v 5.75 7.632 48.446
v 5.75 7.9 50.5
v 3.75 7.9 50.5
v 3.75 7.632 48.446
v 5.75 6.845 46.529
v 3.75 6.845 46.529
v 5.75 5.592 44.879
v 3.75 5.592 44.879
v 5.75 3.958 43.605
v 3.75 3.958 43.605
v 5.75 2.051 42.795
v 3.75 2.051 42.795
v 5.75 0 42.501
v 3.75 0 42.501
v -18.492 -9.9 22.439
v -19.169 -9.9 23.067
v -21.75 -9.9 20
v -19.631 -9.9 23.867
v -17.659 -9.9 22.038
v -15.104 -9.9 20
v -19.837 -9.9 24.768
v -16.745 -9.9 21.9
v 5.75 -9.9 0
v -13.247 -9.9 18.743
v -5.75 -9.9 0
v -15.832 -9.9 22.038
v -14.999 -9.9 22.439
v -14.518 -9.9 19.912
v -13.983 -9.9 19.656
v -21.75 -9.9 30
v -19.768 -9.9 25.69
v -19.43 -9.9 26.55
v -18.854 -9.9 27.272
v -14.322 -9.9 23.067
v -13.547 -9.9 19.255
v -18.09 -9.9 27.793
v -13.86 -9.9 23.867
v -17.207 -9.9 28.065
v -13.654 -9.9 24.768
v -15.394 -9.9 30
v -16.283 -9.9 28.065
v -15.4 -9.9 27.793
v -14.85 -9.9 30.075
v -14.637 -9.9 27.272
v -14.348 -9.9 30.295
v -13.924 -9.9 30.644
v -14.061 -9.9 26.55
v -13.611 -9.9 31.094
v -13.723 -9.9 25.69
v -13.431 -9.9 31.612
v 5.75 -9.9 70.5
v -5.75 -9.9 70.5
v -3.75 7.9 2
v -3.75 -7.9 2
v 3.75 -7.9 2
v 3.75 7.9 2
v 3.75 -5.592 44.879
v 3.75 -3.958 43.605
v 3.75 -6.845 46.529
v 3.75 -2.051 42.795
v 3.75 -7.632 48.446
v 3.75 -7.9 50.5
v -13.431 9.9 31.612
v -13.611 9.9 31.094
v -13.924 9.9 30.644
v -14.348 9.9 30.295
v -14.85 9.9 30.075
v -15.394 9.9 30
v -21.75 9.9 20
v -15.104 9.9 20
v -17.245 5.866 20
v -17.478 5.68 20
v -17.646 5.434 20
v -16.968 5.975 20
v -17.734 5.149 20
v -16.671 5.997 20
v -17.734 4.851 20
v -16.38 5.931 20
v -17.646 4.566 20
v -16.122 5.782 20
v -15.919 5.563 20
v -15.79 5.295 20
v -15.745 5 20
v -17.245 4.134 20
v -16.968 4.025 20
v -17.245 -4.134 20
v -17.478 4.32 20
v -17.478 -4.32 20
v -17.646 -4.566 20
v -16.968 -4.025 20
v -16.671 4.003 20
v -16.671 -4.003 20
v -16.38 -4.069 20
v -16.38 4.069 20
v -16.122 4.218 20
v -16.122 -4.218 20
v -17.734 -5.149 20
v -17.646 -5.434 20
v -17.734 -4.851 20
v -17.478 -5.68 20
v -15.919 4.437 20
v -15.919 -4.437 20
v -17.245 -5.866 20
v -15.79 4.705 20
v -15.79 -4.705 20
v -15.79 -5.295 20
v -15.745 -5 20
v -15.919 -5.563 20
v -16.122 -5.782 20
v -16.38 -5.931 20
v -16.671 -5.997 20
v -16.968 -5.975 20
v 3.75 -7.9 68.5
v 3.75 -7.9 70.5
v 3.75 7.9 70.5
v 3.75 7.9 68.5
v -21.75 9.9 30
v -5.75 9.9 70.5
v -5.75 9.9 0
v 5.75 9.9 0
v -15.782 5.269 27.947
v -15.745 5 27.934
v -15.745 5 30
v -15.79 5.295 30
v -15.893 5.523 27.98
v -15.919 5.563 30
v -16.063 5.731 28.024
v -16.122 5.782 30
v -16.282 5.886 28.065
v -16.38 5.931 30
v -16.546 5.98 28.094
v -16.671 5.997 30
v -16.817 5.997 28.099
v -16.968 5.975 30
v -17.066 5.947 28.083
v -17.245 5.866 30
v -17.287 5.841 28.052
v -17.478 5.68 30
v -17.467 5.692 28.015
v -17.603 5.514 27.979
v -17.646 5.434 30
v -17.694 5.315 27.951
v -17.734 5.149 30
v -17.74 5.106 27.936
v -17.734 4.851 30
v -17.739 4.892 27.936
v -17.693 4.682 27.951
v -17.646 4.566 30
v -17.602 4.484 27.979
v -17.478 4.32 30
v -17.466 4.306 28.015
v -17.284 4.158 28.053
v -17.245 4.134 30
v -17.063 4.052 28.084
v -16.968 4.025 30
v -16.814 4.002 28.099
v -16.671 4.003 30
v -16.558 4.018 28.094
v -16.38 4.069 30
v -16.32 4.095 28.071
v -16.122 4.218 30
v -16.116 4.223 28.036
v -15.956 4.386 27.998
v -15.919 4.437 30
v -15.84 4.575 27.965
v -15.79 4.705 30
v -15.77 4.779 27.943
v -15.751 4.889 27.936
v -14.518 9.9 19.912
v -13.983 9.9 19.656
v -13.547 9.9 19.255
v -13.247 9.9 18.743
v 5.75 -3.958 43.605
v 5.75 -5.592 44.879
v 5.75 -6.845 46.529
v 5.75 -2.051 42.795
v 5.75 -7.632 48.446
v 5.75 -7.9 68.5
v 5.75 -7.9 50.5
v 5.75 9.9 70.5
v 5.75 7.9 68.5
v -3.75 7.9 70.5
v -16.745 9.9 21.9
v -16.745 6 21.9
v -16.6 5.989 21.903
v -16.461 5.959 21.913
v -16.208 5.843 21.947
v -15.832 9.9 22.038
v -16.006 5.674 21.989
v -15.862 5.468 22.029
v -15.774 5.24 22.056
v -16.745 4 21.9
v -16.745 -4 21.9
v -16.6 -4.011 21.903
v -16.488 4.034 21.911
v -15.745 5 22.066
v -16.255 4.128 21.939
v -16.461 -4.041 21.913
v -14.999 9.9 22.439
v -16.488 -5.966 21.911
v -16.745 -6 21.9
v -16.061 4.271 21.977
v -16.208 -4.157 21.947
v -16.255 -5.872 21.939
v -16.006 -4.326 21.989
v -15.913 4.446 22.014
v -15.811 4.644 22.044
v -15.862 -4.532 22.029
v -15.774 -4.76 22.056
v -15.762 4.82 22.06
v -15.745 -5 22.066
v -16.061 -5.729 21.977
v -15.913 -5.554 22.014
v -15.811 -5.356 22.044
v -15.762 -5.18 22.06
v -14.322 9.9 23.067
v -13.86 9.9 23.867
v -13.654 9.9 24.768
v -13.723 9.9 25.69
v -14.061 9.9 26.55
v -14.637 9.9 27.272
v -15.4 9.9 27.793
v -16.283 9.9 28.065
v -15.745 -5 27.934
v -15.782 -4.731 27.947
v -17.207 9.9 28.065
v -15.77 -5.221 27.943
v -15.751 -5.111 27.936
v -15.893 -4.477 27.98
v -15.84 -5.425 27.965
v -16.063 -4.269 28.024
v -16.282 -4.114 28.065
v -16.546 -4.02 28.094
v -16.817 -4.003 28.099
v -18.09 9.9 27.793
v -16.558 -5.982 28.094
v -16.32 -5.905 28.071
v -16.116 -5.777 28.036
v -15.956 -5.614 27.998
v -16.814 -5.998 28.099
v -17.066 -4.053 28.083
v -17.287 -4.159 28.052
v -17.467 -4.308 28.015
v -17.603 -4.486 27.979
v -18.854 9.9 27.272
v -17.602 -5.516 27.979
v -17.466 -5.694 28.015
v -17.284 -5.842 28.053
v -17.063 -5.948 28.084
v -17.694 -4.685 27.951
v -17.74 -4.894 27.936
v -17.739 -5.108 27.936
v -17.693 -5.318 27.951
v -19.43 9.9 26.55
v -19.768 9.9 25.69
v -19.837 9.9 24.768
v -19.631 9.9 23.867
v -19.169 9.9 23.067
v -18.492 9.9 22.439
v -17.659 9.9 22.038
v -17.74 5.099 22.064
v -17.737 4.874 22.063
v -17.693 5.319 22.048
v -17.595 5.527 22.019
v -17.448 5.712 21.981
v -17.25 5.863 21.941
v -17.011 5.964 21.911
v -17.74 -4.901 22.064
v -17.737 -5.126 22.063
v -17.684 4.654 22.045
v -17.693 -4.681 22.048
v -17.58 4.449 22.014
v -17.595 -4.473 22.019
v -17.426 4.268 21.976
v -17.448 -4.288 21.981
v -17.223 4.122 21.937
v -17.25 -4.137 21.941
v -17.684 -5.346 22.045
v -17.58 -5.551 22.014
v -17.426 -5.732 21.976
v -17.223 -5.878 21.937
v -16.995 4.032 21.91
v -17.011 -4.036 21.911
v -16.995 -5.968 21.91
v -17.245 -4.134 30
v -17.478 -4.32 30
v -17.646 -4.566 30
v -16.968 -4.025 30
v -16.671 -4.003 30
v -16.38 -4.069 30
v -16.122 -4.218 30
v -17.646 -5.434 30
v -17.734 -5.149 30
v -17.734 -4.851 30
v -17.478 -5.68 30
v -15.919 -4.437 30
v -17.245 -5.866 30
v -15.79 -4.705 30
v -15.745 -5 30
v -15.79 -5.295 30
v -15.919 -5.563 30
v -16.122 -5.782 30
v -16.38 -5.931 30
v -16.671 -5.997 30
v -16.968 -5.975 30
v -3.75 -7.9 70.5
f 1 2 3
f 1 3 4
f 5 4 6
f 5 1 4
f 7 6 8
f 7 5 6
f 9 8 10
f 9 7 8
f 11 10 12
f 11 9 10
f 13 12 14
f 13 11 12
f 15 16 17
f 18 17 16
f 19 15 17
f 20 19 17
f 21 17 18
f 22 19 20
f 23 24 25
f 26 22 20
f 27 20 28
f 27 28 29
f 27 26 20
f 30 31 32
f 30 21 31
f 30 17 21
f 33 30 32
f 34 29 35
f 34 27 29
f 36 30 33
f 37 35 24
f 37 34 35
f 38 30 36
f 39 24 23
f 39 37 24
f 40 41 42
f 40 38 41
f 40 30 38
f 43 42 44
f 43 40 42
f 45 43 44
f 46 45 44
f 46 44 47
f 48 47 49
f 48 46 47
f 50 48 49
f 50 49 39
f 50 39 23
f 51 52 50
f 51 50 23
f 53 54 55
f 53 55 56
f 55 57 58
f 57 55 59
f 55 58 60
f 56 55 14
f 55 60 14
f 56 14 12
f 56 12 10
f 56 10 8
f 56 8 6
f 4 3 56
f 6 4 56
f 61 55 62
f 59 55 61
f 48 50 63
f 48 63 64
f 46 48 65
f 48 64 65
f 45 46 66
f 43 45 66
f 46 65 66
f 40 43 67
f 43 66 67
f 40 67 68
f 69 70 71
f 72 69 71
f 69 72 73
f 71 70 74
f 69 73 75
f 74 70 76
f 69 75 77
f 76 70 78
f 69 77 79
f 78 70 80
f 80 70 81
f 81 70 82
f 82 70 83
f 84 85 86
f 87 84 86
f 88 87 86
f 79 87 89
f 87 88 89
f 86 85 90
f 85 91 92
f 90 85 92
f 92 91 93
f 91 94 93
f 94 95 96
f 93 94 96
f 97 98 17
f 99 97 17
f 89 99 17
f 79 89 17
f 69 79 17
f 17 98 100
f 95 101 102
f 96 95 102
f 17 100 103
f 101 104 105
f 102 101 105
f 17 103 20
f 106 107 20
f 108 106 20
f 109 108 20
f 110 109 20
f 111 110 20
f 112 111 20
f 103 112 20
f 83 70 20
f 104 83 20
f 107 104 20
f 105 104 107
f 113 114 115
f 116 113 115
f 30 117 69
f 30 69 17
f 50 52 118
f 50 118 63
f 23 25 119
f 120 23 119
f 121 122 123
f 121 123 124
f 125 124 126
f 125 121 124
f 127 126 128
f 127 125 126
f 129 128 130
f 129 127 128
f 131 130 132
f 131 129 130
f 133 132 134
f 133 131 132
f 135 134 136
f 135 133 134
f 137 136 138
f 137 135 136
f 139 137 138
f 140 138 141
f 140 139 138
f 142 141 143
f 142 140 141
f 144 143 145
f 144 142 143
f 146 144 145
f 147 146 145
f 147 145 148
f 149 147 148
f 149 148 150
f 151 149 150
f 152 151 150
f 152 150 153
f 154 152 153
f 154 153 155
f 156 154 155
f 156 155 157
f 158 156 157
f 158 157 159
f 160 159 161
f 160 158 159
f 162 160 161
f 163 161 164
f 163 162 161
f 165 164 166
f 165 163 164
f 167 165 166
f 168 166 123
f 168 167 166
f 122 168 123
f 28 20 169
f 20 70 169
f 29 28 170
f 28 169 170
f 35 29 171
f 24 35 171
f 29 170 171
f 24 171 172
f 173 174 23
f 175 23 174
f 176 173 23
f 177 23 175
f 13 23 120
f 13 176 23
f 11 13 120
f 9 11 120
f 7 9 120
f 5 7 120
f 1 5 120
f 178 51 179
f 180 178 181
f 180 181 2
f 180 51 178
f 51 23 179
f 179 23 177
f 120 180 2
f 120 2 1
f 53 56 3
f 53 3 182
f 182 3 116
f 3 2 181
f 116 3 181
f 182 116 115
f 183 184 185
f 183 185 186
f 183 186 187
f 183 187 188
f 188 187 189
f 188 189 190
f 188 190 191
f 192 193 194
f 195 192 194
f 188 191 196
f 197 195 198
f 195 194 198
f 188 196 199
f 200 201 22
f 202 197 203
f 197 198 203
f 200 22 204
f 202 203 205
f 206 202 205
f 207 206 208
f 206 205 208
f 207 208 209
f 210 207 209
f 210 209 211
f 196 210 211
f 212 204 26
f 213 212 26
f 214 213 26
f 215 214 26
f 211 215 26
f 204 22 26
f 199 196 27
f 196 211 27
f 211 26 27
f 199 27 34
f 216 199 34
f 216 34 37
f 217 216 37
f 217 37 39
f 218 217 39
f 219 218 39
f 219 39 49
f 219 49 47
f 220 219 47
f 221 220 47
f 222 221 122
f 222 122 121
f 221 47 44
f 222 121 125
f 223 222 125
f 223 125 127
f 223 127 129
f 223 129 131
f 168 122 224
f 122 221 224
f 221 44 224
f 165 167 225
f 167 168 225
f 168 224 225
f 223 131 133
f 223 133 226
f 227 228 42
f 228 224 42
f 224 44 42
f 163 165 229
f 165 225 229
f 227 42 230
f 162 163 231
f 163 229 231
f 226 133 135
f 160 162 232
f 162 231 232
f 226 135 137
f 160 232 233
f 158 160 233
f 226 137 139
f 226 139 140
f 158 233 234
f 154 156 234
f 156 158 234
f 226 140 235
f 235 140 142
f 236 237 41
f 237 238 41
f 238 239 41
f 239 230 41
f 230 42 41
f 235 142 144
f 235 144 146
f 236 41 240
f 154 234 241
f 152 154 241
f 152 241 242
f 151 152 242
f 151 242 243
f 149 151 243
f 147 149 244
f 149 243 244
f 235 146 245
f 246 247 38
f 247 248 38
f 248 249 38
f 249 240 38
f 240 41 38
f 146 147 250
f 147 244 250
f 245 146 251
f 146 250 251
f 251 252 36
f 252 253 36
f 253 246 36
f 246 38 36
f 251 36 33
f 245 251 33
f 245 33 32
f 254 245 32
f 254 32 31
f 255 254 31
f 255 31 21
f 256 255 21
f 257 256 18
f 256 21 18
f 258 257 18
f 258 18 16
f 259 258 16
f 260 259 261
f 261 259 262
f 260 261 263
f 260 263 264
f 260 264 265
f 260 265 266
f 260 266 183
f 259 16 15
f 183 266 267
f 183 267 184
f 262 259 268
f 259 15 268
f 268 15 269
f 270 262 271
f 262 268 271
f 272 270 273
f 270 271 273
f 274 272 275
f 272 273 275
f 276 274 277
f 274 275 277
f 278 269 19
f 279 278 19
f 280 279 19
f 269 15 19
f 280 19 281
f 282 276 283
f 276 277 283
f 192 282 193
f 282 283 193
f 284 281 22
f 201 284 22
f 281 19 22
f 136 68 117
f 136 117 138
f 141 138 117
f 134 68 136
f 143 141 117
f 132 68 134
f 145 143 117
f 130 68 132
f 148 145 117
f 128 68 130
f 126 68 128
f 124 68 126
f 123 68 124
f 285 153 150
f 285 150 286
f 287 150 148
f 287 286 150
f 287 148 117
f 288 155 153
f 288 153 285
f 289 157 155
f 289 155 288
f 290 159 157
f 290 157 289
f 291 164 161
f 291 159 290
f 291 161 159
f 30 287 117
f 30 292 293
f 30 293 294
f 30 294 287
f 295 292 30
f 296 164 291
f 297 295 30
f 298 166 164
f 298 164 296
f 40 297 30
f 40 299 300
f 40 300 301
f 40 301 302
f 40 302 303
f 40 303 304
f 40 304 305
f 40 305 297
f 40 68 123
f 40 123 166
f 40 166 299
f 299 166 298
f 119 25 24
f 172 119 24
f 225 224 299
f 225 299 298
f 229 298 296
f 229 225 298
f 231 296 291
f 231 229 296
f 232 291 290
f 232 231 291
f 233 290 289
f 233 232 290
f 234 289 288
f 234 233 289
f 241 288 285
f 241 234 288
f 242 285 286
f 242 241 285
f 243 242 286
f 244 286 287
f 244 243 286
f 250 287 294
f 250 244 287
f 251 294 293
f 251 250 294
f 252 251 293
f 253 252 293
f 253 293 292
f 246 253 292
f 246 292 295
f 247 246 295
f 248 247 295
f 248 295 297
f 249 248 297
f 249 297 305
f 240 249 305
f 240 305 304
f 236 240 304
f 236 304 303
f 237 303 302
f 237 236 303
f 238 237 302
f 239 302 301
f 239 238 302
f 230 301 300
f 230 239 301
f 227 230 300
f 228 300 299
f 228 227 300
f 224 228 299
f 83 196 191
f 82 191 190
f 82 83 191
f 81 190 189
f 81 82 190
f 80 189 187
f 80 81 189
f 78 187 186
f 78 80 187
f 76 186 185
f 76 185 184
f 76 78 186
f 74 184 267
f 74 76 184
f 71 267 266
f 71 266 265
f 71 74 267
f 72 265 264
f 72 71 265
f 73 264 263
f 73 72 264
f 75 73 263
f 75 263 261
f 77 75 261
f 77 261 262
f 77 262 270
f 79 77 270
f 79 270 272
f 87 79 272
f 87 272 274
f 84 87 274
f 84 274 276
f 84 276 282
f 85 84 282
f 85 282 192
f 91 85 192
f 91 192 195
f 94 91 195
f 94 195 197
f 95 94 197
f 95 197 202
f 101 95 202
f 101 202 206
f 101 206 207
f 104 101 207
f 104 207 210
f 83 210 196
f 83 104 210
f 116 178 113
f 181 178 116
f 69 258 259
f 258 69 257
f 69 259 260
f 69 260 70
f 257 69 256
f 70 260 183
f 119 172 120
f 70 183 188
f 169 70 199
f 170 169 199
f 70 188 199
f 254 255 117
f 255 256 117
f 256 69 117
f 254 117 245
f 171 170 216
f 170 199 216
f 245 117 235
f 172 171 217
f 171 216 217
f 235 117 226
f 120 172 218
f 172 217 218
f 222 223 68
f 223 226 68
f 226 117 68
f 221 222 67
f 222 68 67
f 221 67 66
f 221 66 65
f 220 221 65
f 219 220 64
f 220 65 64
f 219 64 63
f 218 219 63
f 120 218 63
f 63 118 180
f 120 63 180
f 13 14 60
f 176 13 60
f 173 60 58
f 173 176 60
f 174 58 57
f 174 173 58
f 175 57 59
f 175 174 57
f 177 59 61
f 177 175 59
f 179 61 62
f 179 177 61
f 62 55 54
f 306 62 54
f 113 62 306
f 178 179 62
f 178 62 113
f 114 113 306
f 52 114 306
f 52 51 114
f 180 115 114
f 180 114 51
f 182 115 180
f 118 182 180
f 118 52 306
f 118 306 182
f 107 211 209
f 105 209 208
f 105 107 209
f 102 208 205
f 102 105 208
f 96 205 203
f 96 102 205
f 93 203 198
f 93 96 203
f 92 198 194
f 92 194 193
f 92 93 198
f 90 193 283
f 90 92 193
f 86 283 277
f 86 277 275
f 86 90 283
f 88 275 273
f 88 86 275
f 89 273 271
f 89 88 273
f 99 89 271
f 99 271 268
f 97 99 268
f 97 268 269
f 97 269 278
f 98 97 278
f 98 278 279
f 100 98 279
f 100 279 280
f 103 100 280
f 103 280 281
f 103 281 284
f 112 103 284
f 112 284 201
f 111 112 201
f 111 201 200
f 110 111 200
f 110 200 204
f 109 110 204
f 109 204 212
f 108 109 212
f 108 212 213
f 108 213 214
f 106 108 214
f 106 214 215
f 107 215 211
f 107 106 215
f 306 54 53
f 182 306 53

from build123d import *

# Parameters (mm, degrees)
CROQUIS1_W                 = 19.8
CROQUIS1_H                 = 11.5
SALIENTE_EXTRUIR1_DEPTH    = 70.5
VACIADO1_T                 = -2
CROQUIS4_W                 = 15.8
CROQUIS4_H                 = 28
CORTAR_EXTRUIR1_DEPTH      = 2
REDONDEO1_R                = 8
CROQUIS5_W                 = 15.8
CROQUIS5_H                 = 2
SALIENTE_EXTRUIR2_DEPTH    = 2
CROQUIS6_W                 = 19.8
CROQUIS6_H                 = 10
SALIENTE_EXTRUIR4_DEPTH    = 16
SALIENTE_EXTRUIR5_DEPTH    = 19.8
CROQUIS10_R                = 3.1
CORTAR_EXTRUIR4_DEPTH      = 19.8
REDONDEO3_R                = 2
CORTAR_EXTRUIR5_DEPTH      = 52.393798264
CORTAR_EXTRUIR5_DEPTH_BACK = 52.393798264
CROQUIS11_R                = 1


with BuildPart() as part:
    # Croquis1 → Saliente-Extruir1 (new body)
    with BuildSketch(Plane(origin=(0, 0, 0), x_dir=(0, 1, 0), z_dir=(0, 0, 1))):
        Rectangle(CROQUIS1_W, CROQUIS1_H)
    extrude(amount=SALIENTE_EXTRUIR1_DEPTH)

    # Vaciado1
    vaciado1_openings = [part.faces().sort_by_distance(p)[0] for p in [
        (0, 0, 70.5),
    ]]
    offset(amount=VACIADO1_T, openings=vaciado1_openings, kind=Kind.INTERSECTION)

    # Croquis4 → Cortar-Extruir1 (cut)
    with BuildSketch(Plane.YZ.offset(5.75)):
        with Locations((0, 56.5)):
            Rectangle(CROQUIS4_W, CROQUIS4_H)
    extrude(amount=-CORTAR_EXTRUIR1_DEPTH, mode=Mode.SUBTRACT)

    # Redondeo1
    # the kernel refuses this fillet: 8 mm, written as the material it adds along each edge
    with BuildSketch(Plane(origin=(5.75, 7.9, 42.5), x_dir=(0, -1, 0), z_dir=(-1, 0, 0)), Plane(origin=(5.75, -7.9, 42.5), x_dir=(0, 0, 1), z_dir=(-1, 0, 0))) as redondeo1_piece_1:
        with BuildLine():
            CenterArc((REDONDEO1_R, REDONDEO1_R), REDONDEO1_R, 180, 90)
            Line((0, REDONDEO1_R), (0, 0))
            Line((0, 0), (REDONDEO1_R, 0))
        make_face()
    extrude(amount=2)

    # Croquis5 → Saliente-Extruir2 (add)
    with BuildSketch(Plane.YZ.offset(5.75)):
        with Locations((0, 69.5)):
            Rectangle(CROQUIS5_W, CROQUIS5_H)
    extrude(amount=-SALIENTE_EXTRUIR2_DEPTH)

    # Croquis6 → Saliente-Extruir4 (add)
    with BuildSketch(Plane(origin=(-5.75, 0, 0), x_dir=(0, -1, 0), z_dir=(-1, 0, 0))):
        with Locations((0, 25)):
            Rectangle(CROQUIS6_W, CROQUIS6_H)
    extrude(amount=SALIENTE_EXTRUIR4_DEPTH)

    # Croquis9 → Saliente-Extruir5 (add)
    with BuildSketch(Plane.XZ.offset(9.9)):
        Polygon((-5.75, 70.5), (-13.75, 30), (-5.75, 30), align=None)
        Polygon((-5.75, 0), (-13.75, 20), (-5.75, 20), align=None)
    extrude(amount=-SALIENTE_EXTRUIR5_DEPTH)

    # Croquis10 → Cortar-Extruir4 (cut)
    with BuildSketch(Plane.XZ.offset(9.9)):
        with Locations(Location((-16.745253682, 25, 0), (0, 0, 270))):
            Circle(CROQUIS10_R)
    extrude(amount=-CORTAR_EXTRUIR4_DEPTH, mode=Mode.SUBTRACT)

    # Redondeo3
    redondeo3_edges = [part.edges().sort_by_distance(p)[0] for p in [
        (-13.75, 0, 20),
        (-13.75, 0, 30),
    ]]
    fillet(redondeo3_edges, radius=REDONDEO3_R)

    # Croquis11 → Cortar-Extruir5 (cut, two sides: drawn at the far end of the back side and taken through both)
    with BuildSketch(Plane(origin=(0, 0, 25), x_dir=(0, -1, 0), z_dir=(0, 0, 1)).offset(-CORTAR_EXTRUIR5_DEPTH_BACK)):
        with Locations(Location((-5, -16.745253682, 0), (0, 0, 90))):
            Circle(CROQUIS11_R)
        with Locations(Location((5, -16.745253682, 0), (0, 0, 90))):
            Circle(CROQUIS11_R)
    extrude(amount=CORTAR_EXTRUIR5_DEPTH + CORTAR_EXTRUIR5_DEPTH_BACK, mode=Mode.SUBTRACT)


solid = part.part
